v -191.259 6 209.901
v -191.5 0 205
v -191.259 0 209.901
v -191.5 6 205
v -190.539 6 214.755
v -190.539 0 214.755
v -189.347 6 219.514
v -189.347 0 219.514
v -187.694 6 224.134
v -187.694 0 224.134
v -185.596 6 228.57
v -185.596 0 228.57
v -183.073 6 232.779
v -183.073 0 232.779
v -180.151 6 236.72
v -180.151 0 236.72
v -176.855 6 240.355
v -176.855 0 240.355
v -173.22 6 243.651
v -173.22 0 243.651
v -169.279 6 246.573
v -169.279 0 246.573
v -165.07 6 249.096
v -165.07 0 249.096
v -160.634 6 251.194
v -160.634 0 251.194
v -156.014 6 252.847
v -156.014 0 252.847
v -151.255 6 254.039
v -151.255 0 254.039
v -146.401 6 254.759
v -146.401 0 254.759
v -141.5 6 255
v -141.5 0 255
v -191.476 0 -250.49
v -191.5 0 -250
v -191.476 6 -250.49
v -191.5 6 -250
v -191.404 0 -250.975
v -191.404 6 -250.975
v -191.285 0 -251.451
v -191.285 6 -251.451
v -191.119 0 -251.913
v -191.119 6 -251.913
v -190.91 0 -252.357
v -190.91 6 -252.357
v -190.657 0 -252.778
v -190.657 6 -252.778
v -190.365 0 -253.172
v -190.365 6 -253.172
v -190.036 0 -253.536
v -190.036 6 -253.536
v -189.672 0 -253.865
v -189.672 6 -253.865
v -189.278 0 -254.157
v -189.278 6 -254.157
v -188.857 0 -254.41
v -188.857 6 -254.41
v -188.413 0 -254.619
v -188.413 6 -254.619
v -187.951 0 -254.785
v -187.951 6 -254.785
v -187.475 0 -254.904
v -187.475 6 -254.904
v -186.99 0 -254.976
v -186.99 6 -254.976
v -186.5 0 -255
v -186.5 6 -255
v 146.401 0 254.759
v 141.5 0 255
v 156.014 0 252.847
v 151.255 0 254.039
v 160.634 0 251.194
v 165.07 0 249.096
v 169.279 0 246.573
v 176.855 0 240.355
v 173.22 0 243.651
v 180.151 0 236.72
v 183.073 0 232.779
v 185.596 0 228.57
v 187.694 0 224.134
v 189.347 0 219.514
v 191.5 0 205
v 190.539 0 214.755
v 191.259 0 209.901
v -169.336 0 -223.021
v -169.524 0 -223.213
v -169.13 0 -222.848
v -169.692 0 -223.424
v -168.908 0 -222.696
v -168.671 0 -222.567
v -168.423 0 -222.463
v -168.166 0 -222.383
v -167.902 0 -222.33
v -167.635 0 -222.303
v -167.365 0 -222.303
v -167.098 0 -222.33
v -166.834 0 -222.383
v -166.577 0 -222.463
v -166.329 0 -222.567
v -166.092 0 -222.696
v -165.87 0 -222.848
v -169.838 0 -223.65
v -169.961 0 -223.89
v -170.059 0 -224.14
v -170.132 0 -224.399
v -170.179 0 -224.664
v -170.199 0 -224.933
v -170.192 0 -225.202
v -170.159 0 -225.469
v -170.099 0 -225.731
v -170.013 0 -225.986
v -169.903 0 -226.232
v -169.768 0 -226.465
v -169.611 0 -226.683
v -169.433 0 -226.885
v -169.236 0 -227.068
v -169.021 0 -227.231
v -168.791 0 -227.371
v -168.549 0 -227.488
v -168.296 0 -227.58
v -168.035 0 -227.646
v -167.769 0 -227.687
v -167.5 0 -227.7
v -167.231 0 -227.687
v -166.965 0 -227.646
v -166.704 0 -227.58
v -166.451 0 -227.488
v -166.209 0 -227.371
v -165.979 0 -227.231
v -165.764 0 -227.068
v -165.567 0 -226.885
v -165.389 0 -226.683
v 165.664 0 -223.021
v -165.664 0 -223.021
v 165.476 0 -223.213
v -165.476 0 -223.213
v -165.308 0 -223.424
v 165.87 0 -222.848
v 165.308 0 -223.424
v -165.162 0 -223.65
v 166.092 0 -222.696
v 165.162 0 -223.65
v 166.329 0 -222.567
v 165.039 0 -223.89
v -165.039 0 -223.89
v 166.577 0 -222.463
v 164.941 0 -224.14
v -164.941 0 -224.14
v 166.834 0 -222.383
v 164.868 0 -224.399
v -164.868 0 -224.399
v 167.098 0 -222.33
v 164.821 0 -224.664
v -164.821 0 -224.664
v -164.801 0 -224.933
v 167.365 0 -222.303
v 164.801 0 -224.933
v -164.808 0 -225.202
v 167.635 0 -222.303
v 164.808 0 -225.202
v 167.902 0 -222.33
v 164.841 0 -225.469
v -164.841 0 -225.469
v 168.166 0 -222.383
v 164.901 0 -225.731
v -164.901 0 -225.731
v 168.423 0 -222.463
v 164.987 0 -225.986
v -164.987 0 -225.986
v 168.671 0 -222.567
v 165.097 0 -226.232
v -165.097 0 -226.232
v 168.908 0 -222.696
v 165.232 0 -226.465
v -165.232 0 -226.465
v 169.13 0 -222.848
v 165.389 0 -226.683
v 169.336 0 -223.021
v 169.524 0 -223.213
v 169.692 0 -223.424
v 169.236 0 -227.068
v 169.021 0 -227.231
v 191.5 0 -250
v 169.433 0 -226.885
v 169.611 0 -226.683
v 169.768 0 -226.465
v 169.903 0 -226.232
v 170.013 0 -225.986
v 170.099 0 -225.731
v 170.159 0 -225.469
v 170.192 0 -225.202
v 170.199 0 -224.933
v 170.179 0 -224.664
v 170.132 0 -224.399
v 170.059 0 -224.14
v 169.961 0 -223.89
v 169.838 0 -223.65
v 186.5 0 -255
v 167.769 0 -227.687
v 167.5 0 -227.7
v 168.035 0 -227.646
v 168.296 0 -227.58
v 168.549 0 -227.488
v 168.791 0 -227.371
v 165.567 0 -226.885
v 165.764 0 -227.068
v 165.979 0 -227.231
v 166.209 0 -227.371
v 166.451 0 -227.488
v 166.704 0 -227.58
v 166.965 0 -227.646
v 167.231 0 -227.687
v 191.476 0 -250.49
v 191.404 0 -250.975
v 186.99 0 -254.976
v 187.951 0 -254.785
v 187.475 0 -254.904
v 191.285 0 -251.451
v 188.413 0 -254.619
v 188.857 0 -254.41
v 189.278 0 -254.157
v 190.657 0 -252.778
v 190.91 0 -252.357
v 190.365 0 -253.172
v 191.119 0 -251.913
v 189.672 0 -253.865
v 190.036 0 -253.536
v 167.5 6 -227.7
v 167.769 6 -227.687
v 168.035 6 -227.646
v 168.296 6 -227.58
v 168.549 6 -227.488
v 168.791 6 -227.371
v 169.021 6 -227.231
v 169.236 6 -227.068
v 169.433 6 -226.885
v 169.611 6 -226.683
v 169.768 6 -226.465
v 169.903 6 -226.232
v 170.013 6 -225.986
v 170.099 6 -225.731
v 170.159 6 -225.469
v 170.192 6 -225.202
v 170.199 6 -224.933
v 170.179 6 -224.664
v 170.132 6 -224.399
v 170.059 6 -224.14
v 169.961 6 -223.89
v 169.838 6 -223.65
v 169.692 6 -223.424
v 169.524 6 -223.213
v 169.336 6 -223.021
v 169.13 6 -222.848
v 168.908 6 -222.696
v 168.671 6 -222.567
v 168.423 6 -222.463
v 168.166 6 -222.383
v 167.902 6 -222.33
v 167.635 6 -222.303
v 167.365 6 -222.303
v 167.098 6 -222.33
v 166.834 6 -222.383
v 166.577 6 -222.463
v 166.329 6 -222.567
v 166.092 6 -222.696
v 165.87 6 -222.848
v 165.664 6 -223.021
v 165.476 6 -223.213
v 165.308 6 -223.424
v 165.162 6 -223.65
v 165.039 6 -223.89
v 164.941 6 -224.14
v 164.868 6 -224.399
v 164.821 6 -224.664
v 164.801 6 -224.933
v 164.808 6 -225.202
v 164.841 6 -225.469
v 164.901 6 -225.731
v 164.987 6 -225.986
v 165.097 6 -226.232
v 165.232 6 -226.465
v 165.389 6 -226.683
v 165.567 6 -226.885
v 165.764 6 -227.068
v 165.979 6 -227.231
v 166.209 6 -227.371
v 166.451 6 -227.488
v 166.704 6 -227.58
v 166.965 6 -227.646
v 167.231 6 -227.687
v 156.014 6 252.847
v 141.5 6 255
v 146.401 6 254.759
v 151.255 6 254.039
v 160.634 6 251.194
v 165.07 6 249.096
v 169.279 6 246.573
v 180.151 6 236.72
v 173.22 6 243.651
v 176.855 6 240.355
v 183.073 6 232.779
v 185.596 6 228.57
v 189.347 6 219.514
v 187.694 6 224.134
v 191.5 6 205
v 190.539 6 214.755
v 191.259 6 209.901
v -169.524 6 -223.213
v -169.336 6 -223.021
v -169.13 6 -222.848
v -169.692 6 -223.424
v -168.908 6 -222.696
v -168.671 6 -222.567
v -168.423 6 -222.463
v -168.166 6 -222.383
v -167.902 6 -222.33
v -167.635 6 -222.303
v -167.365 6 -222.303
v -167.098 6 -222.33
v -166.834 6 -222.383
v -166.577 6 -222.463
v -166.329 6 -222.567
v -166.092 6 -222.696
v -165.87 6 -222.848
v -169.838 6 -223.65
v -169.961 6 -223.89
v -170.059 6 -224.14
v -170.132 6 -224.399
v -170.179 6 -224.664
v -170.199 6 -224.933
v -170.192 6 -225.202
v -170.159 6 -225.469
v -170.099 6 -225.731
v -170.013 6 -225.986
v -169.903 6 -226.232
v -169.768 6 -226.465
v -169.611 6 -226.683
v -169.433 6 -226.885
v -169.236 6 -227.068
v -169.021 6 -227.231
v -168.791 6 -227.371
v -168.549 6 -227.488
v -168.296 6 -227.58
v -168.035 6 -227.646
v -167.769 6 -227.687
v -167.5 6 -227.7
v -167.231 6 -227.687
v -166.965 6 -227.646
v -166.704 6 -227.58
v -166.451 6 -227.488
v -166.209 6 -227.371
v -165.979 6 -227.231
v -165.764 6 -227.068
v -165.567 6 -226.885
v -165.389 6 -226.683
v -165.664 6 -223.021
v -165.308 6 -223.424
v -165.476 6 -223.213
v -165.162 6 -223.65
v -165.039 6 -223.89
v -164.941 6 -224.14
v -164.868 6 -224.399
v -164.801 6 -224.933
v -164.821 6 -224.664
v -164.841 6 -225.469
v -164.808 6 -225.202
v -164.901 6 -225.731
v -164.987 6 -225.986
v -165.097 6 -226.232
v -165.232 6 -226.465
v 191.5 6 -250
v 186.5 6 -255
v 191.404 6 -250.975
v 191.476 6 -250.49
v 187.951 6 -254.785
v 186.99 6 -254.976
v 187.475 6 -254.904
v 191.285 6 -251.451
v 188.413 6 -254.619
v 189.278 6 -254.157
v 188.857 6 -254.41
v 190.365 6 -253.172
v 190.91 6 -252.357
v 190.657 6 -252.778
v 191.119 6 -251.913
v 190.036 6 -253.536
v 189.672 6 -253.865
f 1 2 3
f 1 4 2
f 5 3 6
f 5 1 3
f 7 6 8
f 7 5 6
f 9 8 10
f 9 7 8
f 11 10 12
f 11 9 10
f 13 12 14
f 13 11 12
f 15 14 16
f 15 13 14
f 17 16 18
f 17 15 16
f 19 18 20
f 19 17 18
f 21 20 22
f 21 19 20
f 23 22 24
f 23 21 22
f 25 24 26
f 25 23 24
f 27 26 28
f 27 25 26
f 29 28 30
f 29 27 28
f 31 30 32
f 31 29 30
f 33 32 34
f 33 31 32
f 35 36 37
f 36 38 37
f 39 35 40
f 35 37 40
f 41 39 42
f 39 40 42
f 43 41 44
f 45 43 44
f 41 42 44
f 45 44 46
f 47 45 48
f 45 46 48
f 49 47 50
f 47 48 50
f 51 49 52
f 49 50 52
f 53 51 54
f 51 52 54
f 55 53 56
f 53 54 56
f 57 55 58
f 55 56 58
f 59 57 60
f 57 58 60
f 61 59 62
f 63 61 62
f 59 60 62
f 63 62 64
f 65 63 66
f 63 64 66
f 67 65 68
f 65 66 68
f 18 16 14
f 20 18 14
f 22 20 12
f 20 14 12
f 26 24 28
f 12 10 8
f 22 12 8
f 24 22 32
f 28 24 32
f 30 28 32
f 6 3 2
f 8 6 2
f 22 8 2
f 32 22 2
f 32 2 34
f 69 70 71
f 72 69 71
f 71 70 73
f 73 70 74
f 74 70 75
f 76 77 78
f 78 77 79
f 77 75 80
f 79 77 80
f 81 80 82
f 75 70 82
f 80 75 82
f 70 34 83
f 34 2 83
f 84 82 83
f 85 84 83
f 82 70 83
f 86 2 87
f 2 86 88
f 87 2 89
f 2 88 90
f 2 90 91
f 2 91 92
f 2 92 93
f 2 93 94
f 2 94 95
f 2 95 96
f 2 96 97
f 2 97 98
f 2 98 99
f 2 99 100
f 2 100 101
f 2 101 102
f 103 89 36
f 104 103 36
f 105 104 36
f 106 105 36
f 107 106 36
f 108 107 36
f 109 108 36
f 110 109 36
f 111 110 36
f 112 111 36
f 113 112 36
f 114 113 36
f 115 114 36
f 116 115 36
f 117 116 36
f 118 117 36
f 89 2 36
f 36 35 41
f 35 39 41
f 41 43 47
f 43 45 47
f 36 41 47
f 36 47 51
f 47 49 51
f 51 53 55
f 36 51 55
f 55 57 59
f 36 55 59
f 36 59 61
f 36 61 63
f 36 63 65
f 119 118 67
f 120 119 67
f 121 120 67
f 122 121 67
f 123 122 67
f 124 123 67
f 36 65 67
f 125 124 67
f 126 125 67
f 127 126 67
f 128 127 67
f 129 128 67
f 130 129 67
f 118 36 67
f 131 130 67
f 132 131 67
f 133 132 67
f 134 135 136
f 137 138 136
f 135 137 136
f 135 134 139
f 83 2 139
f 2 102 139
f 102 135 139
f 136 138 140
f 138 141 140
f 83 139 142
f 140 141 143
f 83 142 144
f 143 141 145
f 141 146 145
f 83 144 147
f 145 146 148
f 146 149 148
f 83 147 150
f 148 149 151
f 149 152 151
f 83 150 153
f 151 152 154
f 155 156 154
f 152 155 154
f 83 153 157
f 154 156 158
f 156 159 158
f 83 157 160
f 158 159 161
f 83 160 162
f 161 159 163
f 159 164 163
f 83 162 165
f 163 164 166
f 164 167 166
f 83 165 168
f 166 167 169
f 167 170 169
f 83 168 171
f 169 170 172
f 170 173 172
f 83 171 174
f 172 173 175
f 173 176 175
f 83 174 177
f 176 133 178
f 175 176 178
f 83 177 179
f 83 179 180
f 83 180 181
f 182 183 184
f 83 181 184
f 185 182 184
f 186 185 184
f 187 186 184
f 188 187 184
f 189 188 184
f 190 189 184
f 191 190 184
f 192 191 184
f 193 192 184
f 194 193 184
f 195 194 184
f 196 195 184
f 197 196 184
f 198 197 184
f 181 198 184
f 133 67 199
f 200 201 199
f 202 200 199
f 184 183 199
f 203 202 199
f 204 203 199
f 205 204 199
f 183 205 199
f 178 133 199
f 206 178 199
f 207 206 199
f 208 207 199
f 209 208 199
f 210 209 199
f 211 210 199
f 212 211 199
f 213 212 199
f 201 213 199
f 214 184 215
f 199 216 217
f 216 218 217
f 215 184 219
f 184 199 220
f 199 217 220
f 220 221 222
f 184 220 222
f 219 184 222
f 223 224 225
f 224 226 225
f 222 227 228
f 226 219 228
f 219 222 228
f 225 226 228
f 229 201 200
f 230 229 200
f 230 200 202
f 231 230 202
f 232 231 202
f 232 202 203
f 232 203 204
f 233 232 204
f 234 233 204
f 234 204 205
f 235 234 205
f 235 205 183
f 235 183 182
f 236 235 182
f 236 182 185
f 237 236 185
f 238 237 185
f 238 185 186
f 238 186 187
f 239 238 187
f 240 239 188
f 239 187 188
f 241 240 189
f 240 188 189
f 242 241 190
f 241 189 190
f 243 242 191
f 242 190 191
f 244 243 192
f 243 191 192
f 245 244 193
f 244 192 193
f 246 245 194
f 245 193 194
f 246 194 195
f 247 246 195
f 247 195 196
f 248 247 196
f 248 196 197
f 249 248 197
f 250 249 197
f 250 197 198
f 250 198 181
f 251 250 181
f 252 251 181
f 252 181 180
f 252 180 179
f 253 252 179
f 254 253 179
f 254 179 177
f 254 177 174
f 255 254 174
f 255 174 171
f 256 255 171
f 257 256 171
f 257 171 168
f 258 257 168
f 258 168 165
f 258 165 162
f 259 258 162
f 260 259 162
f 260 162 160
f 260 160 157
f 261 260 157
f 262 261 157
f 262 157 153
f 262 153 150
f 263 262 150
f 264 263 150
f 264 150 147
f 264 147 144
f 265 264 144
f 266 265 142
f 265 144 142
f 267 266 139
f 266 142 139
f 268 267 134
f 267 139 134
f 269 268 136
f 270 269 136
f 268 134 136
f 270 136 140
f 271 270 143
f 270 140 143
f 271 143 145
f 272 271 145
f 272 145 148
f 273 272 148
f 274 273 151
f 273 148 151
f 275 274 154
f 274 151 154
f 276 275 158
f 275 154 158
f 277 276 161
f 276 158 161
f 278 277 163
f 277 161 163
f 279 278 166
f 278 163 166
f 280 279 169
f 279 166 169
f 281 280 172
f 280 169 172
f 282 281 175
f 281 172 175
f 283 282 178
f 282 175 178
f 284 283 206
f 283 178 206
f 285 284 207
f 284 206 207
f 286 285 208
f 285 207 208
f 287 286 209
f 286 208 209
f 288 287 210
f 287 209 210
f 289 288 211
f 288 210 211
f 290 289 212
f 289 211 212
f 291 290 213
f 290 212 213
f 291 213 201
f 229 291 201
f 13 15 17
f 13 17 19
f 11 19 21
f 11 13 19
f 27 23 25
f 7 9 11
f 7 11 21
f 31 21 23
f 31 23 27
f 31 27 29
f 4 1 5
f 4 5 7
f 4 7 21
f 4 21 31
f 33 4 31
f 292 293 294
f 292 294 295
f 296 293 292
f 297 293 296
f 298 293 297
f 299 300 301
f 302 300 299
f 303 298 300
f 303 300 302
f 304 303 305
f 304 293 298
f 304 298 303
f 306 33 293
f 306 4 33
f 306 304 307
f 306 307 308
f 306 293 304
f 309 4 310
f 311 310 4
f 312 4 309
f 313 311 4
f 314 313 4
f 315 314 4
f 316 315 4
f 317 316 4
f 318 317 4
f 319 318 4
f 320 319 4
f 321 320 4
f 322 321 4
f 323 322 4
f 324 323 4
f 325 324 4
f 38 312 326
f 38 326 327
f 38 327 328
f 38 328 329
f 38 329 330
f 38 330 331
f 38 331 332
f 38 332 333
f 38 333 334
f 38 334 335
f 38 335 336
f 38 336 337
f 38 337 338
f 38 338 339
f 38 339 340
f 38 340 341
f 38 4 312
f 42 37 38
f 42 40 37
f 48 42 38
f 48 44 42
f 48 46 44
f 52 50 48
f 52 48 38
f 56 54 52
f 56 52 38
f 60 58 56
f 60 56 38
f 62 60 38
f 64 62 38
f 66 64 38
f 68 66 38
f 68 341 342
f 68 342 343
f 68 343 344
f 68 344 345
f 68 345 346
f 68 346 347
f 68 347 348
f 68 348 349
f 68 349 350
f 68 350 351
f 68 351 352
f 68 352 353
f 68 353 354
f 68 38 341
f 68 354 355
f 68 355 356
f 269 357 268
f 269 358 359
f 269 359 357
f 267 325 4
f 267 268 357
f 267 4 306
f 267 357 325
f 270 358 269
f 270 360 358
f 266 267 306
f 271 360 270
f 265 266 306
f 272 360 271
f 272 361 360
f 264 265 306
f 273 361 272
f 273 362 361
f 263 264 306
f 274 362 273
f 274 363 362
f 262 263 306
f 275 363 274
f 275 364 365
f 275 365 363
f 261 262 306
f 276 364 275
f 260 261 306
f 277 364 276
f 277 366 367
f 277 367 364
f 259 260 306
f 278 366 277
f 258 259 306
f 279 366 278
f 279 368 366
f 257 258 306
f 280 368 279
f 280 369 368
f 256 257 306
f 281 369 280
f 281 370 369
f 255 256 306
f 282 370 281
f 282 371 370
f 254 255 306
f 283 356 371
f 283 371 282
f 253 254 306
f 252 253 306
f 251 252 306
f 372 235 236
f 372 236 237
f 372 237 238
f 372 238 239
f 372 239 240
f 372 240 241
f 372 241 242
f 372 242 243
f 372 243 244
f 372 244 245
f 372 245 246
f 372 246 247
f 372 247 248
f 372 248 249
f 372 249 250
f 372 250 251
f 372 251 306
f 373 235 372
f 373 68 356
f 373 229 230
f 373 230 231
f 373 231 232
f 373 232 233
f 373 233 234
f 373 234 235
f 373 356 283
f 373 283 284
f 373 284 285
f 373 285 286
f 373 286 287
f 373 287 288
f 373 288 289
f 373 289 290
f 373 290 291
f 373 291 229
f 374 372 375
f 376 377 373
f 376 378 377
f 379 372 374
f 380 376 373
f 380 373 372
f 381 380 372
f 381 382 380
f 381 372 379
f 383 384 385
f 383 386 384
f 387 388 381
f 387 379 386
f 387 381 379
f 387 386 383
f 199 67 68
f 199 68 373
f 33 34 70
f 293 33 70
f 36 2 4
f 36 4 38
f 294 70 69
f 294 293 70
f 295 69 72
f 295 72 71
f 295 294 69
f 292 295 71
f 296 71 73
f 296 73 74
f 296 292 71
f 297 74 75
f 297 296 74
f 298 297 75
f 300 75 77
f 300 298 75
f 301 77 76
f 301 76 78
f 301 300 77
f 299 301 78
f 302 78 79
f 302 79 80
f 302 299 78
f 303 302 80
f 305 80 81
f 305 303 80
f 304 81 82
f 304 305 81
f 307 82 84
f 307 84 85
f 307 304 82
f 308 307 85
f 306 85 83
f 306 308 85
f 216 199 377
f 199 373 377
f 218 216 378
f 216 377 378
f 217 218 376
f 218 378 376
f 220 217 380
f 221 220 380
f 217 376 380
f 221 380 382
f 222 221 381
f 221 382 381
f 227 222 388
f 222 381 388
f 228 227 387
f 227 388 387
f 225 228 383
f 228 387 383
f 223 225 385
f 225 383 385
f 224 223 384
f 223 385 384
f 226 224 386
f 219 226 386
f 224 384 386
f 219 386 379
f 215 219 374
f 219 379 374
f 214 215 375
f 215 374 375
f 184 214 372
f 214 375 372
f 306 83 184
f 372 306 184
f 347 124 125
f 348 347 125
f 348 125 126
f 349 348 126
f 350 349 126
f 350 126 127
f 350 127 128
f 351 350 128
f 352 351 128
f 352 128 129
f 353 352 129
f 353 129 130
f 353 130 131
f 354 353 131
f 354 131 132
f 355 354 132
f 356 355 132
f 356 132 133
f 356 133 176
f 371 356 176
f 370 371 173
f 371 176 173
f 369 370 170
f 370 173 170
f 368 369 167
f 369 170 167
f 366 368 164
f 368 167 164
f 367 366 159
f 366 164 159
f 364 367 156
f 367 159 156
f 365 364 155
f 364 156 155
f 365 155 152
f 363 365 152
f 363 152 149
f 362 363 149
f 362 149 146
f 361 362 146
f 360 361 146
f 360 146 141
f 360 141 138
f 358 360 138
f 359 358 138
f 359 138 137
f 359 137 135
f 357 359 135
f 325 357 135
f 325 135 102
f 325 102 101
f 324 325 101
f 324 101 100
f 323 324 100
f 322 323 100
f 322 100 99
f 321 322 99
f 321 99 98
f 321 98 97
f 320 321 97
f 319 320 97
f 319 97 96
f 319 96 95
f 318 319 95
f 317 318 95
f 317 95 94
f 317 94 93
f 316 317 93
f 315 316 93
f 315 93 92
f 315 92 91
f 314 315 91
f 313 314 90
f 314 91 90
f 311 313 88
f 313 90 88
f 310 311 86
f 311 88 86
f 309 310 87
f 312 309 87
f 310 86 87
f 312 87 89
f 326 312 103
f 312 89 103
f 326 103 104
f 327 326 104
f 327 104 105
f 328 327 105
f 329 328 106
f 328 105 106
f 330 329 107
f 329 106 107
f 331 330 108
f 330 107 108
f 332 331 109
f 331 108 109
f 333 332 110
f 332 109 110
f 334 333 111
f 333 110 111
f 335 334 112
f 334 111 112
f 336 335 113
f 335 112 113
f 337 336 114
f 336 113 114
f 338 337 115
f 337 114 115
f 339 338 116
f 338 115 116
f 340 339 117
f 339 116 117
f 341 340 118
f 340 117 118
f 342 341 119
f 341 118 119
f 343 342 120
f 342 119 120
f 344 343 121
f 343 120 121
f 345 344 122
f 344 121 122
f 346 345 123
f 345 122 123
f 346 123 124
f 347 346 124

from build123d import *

# Parameters (mm, degrees)
SKETCH1_W           = 383
SKETCH1_H           = 510
BOSS_EXTRUDE1_DEPTH = 6
SKETCH2_R           = 2.7
CUT_EXTRUDE1_DEPTH  = 319.956501737
FILLET1_R           = 50
FILLET2_R           = 5


with BuildPart() as part:
    # Sketch1 → Boss-Extrude1 (new body)
    with BuildSketch(Plane(origin=(0, 0, 0), x_dir=(1, 0, 0), z_dir=(0, 1, 0))):
        Rectangle(SKETCH1_W, SKETCH1_H)
    extrude(amount=BOSS_EXTRUDE1_DEPTH)

    # Sketch2 → Cut-Extrude1 (cut, through all)
    with BuildSketch(Plane.XZ):
        with Locations(Location((-167.5, -225, 0), (0, 0, 270))):
            Circle(SKETCH2_R)
        with Locations(Location((167.5, -225, 0), (0, 0, 270))):
            Circle(SKETCH2_R)
    extrude(amount=-CUT_EXTRUDE1_DEPTH, mode=Mode.SUBTRACT)

    # Fillet1
    fillet1_edges = [part.edges().sort_by_distance(p)[0] for p in [
        (191.5, 3, 255),
        (-191.5, 3, 255),
    ]]
    fillet(fillet1_edges, radius=FILLET1_R)

    # Fillet2
    fillet2_edges = [part.edges().sort_by_distance(p)[0] for p in [
        (-191.5, 3, -255),
        (191.5, 3, -255),
    ]]
    fillet(fillet2_edges, radius=FILLET2_R)


solid = part.part
